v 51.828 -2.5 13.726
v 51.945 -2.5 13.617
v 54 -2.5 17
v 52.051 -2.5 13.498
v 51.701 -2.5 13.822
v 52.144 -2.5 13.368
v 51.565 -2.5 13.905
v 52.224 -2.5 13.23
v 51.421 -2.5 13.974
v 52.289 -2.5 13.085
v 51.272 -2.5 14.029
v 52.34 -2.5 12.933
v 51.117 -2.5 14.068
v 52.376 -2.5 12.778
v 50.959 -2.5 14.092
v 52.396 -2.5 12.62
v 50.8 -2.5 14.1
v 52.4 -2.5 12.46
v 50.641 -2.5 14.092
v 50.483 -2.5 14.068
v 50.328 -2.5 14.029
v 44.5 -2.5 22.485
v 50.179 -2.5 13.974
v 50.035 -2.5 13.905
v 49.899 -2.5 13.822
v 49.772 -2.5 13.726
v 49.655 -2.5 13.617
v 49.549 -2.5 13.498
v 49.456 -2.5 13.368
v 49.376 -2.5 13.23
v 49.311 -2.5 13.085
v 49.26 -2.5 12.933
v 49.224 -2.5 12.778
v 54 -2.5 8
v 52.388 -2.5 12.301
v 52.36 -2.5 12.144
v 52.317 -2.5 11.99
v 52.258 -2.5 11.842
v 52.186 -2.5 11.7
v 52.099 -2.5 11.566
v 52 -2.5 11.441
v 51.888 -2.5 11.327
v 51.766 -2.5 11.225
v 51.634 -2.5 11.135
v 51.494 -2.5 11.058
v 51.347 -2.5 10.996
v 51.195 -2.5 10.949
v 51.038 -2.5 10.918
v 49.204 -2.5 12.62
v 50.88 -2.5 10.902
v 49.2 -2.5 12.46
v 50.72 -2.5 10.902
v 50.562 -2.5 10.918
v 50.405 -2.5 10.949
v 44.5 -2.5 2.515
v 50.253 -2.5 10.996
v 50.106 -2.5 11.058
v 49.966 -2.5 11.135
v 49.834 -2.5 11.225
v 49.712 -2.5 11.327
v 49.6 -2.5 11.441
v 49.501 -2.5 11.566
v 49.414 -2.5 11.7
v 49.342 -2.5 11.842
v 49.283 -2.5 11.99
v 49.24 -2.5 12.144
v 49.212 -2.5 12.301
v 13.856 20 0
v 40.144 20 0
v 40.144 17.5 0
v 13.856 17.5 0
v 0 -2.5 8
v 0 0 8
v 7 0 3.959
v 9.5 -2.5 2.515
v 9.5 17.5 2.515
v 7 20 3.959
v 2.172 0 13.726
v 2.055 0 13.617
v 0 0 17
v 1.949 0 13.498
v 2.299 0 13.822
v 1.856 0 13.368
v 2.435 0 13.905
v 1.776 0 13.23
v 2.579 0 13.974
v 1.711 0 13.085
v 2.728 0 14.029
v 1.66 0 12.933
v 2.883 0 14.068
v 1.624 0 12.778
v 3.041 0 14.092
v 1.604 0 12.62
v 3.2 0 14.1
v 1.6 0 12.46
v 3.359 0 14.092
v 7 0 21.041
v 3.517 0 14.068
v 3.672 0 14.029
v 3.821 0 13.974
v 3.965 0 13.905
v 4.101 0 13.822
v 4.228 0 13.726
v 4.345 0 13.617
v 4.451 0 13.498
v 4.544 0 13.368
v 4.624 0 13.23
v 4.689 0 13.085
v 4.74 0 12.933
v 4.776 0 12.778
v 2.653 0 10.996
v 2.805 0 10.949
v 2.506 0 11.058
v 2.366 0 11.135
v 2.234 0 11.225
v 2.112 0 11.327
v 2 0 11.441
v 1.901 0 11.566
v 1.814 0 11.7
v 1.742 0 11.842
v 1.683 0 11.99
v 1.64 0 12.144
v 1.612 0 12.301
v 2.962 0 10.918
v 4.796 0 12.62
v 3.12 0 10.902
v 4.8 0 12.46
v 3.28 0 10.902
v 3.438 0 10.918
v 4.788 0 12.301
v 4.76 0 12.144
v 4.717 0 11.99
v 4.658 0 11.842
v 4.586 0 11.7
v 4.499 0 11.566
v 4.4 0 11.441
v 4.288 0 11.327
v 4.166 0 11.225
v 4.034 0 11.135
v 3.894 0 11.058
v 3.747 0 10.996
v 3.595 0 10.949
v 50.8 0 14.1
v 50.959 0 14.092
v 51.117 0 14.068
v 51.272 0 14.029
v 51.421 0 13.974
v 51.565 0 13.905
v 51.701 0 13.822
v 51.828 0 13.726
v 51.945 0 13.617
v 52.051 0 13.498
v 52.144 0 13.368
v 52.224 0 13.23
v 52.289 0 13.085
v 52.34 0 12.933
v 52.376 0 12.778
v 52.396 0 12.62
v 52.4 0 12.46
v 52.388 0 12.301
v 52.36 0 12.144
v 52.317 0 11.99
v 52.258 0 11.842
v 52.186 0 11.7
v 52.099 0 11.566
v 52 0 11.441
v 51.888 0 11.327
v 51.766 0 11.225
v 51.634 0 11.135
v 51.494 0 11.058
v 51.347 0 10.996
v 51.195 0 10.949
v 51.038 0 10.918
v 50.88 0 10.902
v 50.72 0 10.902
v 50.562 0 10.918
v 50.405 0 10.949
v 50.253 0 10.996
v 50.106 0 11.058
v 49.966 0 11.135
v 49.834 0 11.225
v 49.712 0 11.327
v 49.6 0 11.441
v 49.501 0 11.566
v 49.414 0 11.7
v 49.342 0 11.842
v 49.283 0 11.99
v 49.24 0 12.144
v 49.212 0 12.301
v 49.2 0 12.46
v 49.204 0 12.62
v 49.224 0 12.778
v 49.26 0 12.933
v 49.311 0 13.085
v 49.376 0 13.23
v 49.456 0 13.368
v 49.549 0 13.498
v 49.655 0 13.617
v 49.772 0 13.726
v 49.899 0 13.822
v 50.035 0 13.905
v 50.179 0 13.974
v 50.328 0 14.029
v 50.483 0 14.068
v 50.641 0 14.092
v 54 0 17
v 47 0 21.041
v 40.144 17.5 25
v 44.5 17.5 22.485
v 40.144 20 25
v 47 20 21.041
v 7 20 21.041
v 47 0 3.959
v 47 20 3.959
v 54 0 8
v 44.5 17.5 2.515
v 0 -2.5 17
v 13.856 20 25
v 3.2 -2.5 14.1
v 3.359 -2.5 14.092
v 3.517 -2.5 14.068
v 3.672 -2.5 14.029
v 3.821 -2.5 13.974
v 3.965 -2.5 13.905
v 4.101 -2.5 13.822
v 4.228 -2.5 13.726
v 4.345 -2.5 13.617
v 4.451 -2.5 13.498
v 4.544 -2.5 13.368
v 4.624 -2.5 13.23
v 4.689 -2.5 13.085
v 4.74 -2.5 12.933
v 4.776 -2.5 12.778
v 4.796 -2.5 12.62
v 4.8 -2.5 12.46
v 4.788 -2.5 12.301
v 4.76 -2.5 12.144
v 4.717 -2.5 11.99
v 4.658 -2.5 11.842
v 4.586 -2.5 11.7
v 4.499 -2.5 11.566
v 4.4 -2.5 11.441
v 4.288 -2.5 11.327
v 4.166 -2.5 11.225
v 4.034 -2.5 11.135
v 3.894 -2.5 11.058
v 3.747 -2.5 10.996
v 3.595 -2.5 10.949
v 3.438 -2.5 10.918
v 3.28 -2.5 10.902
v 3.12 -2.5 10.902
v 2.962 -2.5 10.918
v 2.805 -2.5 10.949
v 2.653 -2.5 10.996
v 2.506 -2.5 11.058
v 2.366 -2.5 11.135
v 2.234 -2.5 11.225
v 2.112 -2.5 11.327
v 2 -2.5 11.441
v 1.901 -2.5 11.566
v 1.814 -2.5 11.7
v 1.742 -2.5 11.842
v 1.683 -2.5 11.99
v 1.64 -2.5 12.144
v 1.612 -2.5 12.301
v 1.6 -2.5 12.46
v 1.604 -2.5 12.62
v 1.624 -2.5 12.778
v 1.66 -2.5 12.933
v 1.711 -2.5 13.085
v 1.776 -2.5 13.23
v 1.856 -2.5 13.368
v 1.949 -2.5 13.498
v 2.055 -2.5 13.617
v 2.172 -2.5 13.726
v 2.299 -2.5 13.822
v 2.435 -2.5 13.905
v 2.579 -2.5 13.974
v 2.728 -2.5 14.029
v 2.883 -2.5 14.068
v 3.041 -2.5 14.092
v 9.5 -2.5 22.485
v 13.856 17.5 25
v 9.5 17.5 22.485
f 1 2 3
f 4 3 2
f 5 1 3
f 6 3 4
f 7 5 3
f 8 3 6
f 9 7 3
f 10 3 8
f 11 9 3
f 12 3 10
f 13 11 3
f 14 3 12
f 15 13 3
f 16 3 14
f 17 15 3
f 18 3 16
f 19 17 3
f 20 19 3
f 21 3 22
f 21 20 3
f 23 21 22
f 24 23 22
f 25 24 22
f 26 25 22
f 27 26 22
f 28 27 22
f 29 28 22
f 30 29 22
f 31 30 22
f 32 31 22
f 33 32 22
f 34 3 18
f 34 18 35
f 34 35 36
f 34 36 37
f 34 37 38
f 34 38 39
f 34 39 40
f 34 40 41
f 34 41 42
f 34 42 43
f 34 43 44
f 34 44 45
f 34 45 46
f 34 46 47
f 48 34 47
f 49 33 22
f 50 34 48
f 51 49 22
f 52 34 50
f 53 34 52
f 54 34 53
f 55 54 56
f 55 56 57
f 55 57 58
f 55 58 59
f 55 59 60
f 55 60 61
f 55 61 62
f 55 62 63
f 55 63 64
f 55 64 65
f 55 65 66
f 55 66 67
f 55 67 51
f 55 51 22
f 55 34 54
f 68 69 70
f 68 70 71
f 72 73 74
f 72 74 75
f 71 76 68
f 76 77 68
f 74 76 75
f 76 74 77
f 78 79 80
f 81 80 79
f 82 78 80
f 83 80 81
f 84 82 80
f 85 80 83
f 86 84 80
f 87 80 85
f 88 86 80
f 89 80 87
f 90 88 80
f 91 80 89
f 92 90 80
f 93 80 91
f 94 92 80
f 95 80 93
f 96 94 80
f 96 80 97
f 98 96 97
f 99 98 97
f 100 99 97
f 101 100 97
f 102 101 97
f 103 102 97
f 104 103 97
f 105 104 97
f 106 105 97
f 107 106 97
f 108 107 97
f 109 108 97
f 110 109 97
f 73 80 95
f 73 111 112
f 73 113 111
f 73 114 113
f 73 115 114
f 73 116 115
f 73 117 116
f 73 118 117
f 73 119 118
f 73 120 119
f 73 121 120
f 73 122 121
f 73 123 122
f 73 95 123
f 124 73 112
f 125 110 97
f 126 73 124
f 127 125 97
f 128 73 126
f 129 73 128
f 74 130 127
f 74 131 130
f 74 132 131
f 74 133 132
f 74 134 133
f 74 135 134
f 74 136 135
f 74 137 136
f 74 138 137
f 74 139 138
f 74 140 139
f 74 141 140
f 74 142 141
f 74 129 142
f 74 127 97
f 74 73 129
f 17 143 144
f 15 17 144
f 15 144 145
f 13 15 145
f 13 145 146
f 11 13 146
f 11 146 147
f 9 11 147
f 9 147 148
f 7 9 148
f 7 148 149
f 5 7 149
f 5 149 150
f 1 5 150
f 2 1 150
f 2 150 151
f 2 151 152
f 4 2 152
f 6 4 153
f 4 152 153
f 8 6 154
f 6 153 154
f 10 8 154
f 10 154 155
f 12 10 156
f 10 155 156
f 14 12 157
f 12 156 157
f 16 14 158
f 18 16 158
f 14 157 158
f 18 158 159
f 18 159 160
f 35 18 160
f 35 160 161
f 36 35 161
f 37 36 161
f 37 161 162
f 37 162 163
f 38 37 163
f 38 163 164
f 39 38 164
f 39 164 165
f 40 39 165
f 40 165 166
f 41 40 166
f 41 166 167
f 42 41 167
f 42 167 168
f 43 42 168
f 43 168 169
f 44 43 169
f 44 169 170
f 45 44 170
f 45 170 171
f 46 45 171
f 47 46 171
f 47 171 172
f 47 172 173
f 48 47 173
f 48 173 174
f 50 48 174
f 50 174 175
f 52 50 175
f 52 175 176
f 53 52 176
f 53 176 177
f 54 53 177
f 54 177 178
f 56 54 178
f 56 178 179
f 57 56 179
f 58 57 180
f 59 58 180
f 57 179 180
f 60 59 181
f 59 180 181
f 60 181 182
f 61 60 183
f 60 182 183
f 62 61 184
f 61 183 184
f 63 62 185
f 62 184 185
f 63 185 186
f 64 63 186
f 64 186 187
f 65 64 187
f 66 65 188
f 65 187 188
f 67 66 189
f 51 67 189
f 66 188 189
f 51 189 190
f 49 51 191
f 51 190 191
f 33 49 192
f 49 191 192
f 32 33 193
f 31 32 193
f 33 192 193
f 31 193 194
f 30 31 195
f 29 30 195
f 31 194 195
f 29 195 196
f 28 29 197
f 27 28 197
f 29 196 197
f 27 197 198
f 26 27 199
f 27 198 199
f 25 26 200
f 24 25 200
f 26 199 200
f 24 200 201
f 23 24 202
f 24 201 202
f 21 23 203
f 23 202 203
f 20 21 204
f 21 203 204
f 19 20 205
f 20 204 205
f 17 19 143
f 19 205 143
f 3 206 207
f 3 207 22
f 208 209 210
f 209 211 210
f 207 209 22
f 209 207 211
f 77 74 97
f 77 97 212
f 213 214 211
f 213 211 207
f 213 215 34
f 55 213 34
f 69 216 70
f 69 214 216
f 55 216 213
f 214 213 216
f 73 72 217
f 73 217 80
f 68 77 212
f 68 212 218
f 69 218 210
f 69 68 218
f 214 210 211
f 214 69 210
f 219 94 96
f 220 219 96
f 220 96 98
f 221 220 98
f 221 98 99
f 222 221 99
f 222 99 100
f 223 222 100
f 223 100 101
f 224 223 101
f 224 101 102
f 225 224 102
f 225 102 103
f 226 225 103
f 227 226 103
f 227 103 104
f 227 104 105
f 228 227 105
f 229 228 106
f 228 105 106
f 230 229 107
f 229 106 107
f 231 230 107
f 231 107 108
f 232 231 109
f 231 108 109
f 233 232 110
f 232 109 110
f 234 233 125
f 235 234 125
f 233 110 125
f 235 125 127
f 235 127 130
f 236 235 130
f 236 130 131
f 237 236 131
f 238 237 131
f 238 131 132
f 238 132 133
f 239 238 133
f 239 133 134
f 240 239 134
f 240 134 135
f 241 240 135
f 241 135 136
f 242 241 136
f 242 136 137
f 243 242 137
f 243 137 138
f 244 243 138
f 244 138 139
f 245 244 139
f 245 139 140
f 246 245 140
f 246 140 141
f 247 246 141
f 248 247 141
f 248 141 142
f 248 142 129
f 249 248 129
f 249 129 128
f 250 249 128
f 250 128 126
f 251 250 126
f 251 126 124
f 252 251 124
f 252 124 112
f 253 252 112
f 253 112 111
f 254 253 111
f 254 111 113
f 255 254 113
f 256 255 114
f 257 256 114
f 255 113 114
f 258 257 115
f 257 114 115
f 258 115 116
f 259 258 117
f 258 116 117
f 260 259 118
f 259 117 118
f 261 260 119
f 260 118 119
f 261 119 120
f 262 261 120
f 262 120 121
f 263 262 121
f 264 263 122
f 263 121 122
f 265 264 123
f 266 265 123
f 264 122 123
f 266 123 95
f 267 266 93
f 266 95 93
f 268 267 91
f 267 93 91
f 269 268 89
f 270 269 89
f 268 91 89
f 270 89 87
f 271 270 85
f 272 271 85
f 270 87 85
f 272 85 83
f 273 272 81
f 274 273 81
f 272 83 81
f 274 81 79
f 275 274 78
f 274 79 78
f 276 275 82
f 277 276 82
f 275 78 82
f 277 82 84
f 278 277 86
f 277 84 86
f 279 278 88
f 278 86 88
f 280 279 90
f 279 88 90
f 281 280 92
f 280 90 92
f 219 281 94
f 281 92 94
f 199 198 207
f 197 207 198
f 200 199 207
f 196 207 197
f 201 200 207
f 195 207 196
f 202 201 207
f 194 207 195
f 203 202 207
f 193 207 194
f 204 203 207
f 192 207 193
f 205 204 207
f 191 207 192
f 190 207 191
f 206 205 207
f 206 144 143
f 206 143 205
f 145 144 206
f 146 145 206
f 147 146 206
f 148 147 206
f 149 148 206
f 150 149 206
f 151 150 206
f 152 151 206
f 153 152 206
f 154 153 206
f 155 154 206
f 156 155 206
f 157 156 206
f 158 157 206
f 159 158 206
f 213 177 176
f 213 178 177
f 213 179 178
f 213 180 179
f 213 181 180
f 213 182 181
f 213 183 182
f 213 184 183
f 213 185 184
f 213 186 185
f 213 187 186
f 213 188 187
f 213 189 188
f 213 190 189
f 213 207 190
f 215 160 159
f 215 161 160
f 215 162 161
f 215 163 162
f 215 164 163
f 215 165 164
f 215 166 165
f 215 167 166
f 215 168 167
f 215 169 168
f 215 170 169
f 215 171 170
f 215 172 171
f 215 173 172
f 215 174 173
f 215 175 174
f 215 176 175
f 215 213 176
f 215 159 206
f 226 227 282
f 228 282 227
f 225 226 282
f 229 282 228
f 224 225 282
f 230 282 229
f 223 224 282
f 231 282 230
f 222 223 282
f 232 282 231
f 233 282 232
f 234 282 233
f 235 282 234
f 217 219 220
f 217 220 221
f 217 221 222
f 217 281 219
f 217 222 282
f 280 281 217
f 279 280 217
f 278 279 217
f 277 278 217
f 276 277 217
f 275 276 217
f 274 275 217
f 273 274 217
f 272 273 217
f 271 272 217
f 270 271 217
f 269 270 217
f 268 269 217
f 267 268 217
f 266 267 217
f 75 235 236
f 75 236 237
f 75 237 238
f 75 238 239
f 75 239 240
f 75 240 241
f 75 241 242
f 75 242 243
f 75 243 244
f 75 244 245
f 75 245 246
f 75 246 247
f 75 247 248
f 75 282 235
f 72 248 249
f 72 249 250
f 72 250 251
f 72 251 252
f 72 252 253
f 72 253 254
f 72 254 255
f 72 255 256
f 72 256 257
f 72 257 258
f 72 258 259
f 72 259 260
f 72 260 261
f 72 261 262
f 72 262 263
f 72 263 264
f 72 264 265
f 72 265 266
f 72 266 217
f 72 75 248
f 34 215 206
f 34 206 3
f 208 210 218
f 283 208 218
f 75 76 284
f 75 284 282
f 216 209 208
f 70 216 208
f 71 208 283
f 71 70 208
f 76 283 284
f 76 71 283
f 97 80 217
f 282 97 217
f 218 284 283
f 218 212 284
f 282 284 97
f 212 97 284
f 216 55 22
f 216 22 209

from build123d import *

# Parameters (mm, degrees)
EXTRUDE_THIN1_DEPTH = 25
CUT_EXTRUDE1_DEPTH  = 64.618000597
SKETCH3_R           = 1.6
CUT_EXTRUDE2_DEPTH  = 63.777384463


with BuildPart() as part:
    # Sketch1 → Extrude-Thin1 (new body)
    with BuildSketch(Plane.XY):
        Polygon((0, 0), (7, 0), (7, 20), (47, 20), (47, 0), (54, 0), (54, -2.5), (44.5, -2.5), (44.5, 17.5), (9.5, 17.5), (9.5, -2.5), (0, -2.5), align=None)
    extrude(amount=EXTRUDE_THIN1_DEPTH)

    # Sketch2 → Cut-Extrude1 (cut, through all)
    with BuildSketch(Plane(origin=(0, 20, 0), x_dir=(1, 0, 0), z_dir=(0, 1, 0))):
        Polygon((0, -8), (13.856406461, 0), (7, 0), (0, 0), align=None)
        Polygon((0, -17), (13.856406461, -25), (7, -25), (0, -25), align=None)
        Polygon((54, -17), (40.143593539, -25), (47, -25), (54, -25), align=None)
        Polygon((54, -8), (40.143593539, 0), (47, 0), (54, 0), align=None)
    extrude(amount=-CUT_EXTRUDE1_DEPTH, mode=Mode.SUBTRACT)

    # Sketch3 → Cut-Extrude2 (cut, through all)
    with BuildSketch(Plane(origin=(0, 0, 0), x_dir=(1, 0, 0), z_dir=(0, 1, 0))):
        with Locations(Location((50.8, -12.5, 0), (0, 0, 270))):
            Circle(SKETCH3_R)
        with Locations(Location((3.2, -12.5, 0), (0, 0, 270))):
            Circle(SKETCH3_R)
    extrude(amount=-CUT_EXTRUDE2_DEPTH, mode=Mode.SUBTRACT)


solid = part.part
